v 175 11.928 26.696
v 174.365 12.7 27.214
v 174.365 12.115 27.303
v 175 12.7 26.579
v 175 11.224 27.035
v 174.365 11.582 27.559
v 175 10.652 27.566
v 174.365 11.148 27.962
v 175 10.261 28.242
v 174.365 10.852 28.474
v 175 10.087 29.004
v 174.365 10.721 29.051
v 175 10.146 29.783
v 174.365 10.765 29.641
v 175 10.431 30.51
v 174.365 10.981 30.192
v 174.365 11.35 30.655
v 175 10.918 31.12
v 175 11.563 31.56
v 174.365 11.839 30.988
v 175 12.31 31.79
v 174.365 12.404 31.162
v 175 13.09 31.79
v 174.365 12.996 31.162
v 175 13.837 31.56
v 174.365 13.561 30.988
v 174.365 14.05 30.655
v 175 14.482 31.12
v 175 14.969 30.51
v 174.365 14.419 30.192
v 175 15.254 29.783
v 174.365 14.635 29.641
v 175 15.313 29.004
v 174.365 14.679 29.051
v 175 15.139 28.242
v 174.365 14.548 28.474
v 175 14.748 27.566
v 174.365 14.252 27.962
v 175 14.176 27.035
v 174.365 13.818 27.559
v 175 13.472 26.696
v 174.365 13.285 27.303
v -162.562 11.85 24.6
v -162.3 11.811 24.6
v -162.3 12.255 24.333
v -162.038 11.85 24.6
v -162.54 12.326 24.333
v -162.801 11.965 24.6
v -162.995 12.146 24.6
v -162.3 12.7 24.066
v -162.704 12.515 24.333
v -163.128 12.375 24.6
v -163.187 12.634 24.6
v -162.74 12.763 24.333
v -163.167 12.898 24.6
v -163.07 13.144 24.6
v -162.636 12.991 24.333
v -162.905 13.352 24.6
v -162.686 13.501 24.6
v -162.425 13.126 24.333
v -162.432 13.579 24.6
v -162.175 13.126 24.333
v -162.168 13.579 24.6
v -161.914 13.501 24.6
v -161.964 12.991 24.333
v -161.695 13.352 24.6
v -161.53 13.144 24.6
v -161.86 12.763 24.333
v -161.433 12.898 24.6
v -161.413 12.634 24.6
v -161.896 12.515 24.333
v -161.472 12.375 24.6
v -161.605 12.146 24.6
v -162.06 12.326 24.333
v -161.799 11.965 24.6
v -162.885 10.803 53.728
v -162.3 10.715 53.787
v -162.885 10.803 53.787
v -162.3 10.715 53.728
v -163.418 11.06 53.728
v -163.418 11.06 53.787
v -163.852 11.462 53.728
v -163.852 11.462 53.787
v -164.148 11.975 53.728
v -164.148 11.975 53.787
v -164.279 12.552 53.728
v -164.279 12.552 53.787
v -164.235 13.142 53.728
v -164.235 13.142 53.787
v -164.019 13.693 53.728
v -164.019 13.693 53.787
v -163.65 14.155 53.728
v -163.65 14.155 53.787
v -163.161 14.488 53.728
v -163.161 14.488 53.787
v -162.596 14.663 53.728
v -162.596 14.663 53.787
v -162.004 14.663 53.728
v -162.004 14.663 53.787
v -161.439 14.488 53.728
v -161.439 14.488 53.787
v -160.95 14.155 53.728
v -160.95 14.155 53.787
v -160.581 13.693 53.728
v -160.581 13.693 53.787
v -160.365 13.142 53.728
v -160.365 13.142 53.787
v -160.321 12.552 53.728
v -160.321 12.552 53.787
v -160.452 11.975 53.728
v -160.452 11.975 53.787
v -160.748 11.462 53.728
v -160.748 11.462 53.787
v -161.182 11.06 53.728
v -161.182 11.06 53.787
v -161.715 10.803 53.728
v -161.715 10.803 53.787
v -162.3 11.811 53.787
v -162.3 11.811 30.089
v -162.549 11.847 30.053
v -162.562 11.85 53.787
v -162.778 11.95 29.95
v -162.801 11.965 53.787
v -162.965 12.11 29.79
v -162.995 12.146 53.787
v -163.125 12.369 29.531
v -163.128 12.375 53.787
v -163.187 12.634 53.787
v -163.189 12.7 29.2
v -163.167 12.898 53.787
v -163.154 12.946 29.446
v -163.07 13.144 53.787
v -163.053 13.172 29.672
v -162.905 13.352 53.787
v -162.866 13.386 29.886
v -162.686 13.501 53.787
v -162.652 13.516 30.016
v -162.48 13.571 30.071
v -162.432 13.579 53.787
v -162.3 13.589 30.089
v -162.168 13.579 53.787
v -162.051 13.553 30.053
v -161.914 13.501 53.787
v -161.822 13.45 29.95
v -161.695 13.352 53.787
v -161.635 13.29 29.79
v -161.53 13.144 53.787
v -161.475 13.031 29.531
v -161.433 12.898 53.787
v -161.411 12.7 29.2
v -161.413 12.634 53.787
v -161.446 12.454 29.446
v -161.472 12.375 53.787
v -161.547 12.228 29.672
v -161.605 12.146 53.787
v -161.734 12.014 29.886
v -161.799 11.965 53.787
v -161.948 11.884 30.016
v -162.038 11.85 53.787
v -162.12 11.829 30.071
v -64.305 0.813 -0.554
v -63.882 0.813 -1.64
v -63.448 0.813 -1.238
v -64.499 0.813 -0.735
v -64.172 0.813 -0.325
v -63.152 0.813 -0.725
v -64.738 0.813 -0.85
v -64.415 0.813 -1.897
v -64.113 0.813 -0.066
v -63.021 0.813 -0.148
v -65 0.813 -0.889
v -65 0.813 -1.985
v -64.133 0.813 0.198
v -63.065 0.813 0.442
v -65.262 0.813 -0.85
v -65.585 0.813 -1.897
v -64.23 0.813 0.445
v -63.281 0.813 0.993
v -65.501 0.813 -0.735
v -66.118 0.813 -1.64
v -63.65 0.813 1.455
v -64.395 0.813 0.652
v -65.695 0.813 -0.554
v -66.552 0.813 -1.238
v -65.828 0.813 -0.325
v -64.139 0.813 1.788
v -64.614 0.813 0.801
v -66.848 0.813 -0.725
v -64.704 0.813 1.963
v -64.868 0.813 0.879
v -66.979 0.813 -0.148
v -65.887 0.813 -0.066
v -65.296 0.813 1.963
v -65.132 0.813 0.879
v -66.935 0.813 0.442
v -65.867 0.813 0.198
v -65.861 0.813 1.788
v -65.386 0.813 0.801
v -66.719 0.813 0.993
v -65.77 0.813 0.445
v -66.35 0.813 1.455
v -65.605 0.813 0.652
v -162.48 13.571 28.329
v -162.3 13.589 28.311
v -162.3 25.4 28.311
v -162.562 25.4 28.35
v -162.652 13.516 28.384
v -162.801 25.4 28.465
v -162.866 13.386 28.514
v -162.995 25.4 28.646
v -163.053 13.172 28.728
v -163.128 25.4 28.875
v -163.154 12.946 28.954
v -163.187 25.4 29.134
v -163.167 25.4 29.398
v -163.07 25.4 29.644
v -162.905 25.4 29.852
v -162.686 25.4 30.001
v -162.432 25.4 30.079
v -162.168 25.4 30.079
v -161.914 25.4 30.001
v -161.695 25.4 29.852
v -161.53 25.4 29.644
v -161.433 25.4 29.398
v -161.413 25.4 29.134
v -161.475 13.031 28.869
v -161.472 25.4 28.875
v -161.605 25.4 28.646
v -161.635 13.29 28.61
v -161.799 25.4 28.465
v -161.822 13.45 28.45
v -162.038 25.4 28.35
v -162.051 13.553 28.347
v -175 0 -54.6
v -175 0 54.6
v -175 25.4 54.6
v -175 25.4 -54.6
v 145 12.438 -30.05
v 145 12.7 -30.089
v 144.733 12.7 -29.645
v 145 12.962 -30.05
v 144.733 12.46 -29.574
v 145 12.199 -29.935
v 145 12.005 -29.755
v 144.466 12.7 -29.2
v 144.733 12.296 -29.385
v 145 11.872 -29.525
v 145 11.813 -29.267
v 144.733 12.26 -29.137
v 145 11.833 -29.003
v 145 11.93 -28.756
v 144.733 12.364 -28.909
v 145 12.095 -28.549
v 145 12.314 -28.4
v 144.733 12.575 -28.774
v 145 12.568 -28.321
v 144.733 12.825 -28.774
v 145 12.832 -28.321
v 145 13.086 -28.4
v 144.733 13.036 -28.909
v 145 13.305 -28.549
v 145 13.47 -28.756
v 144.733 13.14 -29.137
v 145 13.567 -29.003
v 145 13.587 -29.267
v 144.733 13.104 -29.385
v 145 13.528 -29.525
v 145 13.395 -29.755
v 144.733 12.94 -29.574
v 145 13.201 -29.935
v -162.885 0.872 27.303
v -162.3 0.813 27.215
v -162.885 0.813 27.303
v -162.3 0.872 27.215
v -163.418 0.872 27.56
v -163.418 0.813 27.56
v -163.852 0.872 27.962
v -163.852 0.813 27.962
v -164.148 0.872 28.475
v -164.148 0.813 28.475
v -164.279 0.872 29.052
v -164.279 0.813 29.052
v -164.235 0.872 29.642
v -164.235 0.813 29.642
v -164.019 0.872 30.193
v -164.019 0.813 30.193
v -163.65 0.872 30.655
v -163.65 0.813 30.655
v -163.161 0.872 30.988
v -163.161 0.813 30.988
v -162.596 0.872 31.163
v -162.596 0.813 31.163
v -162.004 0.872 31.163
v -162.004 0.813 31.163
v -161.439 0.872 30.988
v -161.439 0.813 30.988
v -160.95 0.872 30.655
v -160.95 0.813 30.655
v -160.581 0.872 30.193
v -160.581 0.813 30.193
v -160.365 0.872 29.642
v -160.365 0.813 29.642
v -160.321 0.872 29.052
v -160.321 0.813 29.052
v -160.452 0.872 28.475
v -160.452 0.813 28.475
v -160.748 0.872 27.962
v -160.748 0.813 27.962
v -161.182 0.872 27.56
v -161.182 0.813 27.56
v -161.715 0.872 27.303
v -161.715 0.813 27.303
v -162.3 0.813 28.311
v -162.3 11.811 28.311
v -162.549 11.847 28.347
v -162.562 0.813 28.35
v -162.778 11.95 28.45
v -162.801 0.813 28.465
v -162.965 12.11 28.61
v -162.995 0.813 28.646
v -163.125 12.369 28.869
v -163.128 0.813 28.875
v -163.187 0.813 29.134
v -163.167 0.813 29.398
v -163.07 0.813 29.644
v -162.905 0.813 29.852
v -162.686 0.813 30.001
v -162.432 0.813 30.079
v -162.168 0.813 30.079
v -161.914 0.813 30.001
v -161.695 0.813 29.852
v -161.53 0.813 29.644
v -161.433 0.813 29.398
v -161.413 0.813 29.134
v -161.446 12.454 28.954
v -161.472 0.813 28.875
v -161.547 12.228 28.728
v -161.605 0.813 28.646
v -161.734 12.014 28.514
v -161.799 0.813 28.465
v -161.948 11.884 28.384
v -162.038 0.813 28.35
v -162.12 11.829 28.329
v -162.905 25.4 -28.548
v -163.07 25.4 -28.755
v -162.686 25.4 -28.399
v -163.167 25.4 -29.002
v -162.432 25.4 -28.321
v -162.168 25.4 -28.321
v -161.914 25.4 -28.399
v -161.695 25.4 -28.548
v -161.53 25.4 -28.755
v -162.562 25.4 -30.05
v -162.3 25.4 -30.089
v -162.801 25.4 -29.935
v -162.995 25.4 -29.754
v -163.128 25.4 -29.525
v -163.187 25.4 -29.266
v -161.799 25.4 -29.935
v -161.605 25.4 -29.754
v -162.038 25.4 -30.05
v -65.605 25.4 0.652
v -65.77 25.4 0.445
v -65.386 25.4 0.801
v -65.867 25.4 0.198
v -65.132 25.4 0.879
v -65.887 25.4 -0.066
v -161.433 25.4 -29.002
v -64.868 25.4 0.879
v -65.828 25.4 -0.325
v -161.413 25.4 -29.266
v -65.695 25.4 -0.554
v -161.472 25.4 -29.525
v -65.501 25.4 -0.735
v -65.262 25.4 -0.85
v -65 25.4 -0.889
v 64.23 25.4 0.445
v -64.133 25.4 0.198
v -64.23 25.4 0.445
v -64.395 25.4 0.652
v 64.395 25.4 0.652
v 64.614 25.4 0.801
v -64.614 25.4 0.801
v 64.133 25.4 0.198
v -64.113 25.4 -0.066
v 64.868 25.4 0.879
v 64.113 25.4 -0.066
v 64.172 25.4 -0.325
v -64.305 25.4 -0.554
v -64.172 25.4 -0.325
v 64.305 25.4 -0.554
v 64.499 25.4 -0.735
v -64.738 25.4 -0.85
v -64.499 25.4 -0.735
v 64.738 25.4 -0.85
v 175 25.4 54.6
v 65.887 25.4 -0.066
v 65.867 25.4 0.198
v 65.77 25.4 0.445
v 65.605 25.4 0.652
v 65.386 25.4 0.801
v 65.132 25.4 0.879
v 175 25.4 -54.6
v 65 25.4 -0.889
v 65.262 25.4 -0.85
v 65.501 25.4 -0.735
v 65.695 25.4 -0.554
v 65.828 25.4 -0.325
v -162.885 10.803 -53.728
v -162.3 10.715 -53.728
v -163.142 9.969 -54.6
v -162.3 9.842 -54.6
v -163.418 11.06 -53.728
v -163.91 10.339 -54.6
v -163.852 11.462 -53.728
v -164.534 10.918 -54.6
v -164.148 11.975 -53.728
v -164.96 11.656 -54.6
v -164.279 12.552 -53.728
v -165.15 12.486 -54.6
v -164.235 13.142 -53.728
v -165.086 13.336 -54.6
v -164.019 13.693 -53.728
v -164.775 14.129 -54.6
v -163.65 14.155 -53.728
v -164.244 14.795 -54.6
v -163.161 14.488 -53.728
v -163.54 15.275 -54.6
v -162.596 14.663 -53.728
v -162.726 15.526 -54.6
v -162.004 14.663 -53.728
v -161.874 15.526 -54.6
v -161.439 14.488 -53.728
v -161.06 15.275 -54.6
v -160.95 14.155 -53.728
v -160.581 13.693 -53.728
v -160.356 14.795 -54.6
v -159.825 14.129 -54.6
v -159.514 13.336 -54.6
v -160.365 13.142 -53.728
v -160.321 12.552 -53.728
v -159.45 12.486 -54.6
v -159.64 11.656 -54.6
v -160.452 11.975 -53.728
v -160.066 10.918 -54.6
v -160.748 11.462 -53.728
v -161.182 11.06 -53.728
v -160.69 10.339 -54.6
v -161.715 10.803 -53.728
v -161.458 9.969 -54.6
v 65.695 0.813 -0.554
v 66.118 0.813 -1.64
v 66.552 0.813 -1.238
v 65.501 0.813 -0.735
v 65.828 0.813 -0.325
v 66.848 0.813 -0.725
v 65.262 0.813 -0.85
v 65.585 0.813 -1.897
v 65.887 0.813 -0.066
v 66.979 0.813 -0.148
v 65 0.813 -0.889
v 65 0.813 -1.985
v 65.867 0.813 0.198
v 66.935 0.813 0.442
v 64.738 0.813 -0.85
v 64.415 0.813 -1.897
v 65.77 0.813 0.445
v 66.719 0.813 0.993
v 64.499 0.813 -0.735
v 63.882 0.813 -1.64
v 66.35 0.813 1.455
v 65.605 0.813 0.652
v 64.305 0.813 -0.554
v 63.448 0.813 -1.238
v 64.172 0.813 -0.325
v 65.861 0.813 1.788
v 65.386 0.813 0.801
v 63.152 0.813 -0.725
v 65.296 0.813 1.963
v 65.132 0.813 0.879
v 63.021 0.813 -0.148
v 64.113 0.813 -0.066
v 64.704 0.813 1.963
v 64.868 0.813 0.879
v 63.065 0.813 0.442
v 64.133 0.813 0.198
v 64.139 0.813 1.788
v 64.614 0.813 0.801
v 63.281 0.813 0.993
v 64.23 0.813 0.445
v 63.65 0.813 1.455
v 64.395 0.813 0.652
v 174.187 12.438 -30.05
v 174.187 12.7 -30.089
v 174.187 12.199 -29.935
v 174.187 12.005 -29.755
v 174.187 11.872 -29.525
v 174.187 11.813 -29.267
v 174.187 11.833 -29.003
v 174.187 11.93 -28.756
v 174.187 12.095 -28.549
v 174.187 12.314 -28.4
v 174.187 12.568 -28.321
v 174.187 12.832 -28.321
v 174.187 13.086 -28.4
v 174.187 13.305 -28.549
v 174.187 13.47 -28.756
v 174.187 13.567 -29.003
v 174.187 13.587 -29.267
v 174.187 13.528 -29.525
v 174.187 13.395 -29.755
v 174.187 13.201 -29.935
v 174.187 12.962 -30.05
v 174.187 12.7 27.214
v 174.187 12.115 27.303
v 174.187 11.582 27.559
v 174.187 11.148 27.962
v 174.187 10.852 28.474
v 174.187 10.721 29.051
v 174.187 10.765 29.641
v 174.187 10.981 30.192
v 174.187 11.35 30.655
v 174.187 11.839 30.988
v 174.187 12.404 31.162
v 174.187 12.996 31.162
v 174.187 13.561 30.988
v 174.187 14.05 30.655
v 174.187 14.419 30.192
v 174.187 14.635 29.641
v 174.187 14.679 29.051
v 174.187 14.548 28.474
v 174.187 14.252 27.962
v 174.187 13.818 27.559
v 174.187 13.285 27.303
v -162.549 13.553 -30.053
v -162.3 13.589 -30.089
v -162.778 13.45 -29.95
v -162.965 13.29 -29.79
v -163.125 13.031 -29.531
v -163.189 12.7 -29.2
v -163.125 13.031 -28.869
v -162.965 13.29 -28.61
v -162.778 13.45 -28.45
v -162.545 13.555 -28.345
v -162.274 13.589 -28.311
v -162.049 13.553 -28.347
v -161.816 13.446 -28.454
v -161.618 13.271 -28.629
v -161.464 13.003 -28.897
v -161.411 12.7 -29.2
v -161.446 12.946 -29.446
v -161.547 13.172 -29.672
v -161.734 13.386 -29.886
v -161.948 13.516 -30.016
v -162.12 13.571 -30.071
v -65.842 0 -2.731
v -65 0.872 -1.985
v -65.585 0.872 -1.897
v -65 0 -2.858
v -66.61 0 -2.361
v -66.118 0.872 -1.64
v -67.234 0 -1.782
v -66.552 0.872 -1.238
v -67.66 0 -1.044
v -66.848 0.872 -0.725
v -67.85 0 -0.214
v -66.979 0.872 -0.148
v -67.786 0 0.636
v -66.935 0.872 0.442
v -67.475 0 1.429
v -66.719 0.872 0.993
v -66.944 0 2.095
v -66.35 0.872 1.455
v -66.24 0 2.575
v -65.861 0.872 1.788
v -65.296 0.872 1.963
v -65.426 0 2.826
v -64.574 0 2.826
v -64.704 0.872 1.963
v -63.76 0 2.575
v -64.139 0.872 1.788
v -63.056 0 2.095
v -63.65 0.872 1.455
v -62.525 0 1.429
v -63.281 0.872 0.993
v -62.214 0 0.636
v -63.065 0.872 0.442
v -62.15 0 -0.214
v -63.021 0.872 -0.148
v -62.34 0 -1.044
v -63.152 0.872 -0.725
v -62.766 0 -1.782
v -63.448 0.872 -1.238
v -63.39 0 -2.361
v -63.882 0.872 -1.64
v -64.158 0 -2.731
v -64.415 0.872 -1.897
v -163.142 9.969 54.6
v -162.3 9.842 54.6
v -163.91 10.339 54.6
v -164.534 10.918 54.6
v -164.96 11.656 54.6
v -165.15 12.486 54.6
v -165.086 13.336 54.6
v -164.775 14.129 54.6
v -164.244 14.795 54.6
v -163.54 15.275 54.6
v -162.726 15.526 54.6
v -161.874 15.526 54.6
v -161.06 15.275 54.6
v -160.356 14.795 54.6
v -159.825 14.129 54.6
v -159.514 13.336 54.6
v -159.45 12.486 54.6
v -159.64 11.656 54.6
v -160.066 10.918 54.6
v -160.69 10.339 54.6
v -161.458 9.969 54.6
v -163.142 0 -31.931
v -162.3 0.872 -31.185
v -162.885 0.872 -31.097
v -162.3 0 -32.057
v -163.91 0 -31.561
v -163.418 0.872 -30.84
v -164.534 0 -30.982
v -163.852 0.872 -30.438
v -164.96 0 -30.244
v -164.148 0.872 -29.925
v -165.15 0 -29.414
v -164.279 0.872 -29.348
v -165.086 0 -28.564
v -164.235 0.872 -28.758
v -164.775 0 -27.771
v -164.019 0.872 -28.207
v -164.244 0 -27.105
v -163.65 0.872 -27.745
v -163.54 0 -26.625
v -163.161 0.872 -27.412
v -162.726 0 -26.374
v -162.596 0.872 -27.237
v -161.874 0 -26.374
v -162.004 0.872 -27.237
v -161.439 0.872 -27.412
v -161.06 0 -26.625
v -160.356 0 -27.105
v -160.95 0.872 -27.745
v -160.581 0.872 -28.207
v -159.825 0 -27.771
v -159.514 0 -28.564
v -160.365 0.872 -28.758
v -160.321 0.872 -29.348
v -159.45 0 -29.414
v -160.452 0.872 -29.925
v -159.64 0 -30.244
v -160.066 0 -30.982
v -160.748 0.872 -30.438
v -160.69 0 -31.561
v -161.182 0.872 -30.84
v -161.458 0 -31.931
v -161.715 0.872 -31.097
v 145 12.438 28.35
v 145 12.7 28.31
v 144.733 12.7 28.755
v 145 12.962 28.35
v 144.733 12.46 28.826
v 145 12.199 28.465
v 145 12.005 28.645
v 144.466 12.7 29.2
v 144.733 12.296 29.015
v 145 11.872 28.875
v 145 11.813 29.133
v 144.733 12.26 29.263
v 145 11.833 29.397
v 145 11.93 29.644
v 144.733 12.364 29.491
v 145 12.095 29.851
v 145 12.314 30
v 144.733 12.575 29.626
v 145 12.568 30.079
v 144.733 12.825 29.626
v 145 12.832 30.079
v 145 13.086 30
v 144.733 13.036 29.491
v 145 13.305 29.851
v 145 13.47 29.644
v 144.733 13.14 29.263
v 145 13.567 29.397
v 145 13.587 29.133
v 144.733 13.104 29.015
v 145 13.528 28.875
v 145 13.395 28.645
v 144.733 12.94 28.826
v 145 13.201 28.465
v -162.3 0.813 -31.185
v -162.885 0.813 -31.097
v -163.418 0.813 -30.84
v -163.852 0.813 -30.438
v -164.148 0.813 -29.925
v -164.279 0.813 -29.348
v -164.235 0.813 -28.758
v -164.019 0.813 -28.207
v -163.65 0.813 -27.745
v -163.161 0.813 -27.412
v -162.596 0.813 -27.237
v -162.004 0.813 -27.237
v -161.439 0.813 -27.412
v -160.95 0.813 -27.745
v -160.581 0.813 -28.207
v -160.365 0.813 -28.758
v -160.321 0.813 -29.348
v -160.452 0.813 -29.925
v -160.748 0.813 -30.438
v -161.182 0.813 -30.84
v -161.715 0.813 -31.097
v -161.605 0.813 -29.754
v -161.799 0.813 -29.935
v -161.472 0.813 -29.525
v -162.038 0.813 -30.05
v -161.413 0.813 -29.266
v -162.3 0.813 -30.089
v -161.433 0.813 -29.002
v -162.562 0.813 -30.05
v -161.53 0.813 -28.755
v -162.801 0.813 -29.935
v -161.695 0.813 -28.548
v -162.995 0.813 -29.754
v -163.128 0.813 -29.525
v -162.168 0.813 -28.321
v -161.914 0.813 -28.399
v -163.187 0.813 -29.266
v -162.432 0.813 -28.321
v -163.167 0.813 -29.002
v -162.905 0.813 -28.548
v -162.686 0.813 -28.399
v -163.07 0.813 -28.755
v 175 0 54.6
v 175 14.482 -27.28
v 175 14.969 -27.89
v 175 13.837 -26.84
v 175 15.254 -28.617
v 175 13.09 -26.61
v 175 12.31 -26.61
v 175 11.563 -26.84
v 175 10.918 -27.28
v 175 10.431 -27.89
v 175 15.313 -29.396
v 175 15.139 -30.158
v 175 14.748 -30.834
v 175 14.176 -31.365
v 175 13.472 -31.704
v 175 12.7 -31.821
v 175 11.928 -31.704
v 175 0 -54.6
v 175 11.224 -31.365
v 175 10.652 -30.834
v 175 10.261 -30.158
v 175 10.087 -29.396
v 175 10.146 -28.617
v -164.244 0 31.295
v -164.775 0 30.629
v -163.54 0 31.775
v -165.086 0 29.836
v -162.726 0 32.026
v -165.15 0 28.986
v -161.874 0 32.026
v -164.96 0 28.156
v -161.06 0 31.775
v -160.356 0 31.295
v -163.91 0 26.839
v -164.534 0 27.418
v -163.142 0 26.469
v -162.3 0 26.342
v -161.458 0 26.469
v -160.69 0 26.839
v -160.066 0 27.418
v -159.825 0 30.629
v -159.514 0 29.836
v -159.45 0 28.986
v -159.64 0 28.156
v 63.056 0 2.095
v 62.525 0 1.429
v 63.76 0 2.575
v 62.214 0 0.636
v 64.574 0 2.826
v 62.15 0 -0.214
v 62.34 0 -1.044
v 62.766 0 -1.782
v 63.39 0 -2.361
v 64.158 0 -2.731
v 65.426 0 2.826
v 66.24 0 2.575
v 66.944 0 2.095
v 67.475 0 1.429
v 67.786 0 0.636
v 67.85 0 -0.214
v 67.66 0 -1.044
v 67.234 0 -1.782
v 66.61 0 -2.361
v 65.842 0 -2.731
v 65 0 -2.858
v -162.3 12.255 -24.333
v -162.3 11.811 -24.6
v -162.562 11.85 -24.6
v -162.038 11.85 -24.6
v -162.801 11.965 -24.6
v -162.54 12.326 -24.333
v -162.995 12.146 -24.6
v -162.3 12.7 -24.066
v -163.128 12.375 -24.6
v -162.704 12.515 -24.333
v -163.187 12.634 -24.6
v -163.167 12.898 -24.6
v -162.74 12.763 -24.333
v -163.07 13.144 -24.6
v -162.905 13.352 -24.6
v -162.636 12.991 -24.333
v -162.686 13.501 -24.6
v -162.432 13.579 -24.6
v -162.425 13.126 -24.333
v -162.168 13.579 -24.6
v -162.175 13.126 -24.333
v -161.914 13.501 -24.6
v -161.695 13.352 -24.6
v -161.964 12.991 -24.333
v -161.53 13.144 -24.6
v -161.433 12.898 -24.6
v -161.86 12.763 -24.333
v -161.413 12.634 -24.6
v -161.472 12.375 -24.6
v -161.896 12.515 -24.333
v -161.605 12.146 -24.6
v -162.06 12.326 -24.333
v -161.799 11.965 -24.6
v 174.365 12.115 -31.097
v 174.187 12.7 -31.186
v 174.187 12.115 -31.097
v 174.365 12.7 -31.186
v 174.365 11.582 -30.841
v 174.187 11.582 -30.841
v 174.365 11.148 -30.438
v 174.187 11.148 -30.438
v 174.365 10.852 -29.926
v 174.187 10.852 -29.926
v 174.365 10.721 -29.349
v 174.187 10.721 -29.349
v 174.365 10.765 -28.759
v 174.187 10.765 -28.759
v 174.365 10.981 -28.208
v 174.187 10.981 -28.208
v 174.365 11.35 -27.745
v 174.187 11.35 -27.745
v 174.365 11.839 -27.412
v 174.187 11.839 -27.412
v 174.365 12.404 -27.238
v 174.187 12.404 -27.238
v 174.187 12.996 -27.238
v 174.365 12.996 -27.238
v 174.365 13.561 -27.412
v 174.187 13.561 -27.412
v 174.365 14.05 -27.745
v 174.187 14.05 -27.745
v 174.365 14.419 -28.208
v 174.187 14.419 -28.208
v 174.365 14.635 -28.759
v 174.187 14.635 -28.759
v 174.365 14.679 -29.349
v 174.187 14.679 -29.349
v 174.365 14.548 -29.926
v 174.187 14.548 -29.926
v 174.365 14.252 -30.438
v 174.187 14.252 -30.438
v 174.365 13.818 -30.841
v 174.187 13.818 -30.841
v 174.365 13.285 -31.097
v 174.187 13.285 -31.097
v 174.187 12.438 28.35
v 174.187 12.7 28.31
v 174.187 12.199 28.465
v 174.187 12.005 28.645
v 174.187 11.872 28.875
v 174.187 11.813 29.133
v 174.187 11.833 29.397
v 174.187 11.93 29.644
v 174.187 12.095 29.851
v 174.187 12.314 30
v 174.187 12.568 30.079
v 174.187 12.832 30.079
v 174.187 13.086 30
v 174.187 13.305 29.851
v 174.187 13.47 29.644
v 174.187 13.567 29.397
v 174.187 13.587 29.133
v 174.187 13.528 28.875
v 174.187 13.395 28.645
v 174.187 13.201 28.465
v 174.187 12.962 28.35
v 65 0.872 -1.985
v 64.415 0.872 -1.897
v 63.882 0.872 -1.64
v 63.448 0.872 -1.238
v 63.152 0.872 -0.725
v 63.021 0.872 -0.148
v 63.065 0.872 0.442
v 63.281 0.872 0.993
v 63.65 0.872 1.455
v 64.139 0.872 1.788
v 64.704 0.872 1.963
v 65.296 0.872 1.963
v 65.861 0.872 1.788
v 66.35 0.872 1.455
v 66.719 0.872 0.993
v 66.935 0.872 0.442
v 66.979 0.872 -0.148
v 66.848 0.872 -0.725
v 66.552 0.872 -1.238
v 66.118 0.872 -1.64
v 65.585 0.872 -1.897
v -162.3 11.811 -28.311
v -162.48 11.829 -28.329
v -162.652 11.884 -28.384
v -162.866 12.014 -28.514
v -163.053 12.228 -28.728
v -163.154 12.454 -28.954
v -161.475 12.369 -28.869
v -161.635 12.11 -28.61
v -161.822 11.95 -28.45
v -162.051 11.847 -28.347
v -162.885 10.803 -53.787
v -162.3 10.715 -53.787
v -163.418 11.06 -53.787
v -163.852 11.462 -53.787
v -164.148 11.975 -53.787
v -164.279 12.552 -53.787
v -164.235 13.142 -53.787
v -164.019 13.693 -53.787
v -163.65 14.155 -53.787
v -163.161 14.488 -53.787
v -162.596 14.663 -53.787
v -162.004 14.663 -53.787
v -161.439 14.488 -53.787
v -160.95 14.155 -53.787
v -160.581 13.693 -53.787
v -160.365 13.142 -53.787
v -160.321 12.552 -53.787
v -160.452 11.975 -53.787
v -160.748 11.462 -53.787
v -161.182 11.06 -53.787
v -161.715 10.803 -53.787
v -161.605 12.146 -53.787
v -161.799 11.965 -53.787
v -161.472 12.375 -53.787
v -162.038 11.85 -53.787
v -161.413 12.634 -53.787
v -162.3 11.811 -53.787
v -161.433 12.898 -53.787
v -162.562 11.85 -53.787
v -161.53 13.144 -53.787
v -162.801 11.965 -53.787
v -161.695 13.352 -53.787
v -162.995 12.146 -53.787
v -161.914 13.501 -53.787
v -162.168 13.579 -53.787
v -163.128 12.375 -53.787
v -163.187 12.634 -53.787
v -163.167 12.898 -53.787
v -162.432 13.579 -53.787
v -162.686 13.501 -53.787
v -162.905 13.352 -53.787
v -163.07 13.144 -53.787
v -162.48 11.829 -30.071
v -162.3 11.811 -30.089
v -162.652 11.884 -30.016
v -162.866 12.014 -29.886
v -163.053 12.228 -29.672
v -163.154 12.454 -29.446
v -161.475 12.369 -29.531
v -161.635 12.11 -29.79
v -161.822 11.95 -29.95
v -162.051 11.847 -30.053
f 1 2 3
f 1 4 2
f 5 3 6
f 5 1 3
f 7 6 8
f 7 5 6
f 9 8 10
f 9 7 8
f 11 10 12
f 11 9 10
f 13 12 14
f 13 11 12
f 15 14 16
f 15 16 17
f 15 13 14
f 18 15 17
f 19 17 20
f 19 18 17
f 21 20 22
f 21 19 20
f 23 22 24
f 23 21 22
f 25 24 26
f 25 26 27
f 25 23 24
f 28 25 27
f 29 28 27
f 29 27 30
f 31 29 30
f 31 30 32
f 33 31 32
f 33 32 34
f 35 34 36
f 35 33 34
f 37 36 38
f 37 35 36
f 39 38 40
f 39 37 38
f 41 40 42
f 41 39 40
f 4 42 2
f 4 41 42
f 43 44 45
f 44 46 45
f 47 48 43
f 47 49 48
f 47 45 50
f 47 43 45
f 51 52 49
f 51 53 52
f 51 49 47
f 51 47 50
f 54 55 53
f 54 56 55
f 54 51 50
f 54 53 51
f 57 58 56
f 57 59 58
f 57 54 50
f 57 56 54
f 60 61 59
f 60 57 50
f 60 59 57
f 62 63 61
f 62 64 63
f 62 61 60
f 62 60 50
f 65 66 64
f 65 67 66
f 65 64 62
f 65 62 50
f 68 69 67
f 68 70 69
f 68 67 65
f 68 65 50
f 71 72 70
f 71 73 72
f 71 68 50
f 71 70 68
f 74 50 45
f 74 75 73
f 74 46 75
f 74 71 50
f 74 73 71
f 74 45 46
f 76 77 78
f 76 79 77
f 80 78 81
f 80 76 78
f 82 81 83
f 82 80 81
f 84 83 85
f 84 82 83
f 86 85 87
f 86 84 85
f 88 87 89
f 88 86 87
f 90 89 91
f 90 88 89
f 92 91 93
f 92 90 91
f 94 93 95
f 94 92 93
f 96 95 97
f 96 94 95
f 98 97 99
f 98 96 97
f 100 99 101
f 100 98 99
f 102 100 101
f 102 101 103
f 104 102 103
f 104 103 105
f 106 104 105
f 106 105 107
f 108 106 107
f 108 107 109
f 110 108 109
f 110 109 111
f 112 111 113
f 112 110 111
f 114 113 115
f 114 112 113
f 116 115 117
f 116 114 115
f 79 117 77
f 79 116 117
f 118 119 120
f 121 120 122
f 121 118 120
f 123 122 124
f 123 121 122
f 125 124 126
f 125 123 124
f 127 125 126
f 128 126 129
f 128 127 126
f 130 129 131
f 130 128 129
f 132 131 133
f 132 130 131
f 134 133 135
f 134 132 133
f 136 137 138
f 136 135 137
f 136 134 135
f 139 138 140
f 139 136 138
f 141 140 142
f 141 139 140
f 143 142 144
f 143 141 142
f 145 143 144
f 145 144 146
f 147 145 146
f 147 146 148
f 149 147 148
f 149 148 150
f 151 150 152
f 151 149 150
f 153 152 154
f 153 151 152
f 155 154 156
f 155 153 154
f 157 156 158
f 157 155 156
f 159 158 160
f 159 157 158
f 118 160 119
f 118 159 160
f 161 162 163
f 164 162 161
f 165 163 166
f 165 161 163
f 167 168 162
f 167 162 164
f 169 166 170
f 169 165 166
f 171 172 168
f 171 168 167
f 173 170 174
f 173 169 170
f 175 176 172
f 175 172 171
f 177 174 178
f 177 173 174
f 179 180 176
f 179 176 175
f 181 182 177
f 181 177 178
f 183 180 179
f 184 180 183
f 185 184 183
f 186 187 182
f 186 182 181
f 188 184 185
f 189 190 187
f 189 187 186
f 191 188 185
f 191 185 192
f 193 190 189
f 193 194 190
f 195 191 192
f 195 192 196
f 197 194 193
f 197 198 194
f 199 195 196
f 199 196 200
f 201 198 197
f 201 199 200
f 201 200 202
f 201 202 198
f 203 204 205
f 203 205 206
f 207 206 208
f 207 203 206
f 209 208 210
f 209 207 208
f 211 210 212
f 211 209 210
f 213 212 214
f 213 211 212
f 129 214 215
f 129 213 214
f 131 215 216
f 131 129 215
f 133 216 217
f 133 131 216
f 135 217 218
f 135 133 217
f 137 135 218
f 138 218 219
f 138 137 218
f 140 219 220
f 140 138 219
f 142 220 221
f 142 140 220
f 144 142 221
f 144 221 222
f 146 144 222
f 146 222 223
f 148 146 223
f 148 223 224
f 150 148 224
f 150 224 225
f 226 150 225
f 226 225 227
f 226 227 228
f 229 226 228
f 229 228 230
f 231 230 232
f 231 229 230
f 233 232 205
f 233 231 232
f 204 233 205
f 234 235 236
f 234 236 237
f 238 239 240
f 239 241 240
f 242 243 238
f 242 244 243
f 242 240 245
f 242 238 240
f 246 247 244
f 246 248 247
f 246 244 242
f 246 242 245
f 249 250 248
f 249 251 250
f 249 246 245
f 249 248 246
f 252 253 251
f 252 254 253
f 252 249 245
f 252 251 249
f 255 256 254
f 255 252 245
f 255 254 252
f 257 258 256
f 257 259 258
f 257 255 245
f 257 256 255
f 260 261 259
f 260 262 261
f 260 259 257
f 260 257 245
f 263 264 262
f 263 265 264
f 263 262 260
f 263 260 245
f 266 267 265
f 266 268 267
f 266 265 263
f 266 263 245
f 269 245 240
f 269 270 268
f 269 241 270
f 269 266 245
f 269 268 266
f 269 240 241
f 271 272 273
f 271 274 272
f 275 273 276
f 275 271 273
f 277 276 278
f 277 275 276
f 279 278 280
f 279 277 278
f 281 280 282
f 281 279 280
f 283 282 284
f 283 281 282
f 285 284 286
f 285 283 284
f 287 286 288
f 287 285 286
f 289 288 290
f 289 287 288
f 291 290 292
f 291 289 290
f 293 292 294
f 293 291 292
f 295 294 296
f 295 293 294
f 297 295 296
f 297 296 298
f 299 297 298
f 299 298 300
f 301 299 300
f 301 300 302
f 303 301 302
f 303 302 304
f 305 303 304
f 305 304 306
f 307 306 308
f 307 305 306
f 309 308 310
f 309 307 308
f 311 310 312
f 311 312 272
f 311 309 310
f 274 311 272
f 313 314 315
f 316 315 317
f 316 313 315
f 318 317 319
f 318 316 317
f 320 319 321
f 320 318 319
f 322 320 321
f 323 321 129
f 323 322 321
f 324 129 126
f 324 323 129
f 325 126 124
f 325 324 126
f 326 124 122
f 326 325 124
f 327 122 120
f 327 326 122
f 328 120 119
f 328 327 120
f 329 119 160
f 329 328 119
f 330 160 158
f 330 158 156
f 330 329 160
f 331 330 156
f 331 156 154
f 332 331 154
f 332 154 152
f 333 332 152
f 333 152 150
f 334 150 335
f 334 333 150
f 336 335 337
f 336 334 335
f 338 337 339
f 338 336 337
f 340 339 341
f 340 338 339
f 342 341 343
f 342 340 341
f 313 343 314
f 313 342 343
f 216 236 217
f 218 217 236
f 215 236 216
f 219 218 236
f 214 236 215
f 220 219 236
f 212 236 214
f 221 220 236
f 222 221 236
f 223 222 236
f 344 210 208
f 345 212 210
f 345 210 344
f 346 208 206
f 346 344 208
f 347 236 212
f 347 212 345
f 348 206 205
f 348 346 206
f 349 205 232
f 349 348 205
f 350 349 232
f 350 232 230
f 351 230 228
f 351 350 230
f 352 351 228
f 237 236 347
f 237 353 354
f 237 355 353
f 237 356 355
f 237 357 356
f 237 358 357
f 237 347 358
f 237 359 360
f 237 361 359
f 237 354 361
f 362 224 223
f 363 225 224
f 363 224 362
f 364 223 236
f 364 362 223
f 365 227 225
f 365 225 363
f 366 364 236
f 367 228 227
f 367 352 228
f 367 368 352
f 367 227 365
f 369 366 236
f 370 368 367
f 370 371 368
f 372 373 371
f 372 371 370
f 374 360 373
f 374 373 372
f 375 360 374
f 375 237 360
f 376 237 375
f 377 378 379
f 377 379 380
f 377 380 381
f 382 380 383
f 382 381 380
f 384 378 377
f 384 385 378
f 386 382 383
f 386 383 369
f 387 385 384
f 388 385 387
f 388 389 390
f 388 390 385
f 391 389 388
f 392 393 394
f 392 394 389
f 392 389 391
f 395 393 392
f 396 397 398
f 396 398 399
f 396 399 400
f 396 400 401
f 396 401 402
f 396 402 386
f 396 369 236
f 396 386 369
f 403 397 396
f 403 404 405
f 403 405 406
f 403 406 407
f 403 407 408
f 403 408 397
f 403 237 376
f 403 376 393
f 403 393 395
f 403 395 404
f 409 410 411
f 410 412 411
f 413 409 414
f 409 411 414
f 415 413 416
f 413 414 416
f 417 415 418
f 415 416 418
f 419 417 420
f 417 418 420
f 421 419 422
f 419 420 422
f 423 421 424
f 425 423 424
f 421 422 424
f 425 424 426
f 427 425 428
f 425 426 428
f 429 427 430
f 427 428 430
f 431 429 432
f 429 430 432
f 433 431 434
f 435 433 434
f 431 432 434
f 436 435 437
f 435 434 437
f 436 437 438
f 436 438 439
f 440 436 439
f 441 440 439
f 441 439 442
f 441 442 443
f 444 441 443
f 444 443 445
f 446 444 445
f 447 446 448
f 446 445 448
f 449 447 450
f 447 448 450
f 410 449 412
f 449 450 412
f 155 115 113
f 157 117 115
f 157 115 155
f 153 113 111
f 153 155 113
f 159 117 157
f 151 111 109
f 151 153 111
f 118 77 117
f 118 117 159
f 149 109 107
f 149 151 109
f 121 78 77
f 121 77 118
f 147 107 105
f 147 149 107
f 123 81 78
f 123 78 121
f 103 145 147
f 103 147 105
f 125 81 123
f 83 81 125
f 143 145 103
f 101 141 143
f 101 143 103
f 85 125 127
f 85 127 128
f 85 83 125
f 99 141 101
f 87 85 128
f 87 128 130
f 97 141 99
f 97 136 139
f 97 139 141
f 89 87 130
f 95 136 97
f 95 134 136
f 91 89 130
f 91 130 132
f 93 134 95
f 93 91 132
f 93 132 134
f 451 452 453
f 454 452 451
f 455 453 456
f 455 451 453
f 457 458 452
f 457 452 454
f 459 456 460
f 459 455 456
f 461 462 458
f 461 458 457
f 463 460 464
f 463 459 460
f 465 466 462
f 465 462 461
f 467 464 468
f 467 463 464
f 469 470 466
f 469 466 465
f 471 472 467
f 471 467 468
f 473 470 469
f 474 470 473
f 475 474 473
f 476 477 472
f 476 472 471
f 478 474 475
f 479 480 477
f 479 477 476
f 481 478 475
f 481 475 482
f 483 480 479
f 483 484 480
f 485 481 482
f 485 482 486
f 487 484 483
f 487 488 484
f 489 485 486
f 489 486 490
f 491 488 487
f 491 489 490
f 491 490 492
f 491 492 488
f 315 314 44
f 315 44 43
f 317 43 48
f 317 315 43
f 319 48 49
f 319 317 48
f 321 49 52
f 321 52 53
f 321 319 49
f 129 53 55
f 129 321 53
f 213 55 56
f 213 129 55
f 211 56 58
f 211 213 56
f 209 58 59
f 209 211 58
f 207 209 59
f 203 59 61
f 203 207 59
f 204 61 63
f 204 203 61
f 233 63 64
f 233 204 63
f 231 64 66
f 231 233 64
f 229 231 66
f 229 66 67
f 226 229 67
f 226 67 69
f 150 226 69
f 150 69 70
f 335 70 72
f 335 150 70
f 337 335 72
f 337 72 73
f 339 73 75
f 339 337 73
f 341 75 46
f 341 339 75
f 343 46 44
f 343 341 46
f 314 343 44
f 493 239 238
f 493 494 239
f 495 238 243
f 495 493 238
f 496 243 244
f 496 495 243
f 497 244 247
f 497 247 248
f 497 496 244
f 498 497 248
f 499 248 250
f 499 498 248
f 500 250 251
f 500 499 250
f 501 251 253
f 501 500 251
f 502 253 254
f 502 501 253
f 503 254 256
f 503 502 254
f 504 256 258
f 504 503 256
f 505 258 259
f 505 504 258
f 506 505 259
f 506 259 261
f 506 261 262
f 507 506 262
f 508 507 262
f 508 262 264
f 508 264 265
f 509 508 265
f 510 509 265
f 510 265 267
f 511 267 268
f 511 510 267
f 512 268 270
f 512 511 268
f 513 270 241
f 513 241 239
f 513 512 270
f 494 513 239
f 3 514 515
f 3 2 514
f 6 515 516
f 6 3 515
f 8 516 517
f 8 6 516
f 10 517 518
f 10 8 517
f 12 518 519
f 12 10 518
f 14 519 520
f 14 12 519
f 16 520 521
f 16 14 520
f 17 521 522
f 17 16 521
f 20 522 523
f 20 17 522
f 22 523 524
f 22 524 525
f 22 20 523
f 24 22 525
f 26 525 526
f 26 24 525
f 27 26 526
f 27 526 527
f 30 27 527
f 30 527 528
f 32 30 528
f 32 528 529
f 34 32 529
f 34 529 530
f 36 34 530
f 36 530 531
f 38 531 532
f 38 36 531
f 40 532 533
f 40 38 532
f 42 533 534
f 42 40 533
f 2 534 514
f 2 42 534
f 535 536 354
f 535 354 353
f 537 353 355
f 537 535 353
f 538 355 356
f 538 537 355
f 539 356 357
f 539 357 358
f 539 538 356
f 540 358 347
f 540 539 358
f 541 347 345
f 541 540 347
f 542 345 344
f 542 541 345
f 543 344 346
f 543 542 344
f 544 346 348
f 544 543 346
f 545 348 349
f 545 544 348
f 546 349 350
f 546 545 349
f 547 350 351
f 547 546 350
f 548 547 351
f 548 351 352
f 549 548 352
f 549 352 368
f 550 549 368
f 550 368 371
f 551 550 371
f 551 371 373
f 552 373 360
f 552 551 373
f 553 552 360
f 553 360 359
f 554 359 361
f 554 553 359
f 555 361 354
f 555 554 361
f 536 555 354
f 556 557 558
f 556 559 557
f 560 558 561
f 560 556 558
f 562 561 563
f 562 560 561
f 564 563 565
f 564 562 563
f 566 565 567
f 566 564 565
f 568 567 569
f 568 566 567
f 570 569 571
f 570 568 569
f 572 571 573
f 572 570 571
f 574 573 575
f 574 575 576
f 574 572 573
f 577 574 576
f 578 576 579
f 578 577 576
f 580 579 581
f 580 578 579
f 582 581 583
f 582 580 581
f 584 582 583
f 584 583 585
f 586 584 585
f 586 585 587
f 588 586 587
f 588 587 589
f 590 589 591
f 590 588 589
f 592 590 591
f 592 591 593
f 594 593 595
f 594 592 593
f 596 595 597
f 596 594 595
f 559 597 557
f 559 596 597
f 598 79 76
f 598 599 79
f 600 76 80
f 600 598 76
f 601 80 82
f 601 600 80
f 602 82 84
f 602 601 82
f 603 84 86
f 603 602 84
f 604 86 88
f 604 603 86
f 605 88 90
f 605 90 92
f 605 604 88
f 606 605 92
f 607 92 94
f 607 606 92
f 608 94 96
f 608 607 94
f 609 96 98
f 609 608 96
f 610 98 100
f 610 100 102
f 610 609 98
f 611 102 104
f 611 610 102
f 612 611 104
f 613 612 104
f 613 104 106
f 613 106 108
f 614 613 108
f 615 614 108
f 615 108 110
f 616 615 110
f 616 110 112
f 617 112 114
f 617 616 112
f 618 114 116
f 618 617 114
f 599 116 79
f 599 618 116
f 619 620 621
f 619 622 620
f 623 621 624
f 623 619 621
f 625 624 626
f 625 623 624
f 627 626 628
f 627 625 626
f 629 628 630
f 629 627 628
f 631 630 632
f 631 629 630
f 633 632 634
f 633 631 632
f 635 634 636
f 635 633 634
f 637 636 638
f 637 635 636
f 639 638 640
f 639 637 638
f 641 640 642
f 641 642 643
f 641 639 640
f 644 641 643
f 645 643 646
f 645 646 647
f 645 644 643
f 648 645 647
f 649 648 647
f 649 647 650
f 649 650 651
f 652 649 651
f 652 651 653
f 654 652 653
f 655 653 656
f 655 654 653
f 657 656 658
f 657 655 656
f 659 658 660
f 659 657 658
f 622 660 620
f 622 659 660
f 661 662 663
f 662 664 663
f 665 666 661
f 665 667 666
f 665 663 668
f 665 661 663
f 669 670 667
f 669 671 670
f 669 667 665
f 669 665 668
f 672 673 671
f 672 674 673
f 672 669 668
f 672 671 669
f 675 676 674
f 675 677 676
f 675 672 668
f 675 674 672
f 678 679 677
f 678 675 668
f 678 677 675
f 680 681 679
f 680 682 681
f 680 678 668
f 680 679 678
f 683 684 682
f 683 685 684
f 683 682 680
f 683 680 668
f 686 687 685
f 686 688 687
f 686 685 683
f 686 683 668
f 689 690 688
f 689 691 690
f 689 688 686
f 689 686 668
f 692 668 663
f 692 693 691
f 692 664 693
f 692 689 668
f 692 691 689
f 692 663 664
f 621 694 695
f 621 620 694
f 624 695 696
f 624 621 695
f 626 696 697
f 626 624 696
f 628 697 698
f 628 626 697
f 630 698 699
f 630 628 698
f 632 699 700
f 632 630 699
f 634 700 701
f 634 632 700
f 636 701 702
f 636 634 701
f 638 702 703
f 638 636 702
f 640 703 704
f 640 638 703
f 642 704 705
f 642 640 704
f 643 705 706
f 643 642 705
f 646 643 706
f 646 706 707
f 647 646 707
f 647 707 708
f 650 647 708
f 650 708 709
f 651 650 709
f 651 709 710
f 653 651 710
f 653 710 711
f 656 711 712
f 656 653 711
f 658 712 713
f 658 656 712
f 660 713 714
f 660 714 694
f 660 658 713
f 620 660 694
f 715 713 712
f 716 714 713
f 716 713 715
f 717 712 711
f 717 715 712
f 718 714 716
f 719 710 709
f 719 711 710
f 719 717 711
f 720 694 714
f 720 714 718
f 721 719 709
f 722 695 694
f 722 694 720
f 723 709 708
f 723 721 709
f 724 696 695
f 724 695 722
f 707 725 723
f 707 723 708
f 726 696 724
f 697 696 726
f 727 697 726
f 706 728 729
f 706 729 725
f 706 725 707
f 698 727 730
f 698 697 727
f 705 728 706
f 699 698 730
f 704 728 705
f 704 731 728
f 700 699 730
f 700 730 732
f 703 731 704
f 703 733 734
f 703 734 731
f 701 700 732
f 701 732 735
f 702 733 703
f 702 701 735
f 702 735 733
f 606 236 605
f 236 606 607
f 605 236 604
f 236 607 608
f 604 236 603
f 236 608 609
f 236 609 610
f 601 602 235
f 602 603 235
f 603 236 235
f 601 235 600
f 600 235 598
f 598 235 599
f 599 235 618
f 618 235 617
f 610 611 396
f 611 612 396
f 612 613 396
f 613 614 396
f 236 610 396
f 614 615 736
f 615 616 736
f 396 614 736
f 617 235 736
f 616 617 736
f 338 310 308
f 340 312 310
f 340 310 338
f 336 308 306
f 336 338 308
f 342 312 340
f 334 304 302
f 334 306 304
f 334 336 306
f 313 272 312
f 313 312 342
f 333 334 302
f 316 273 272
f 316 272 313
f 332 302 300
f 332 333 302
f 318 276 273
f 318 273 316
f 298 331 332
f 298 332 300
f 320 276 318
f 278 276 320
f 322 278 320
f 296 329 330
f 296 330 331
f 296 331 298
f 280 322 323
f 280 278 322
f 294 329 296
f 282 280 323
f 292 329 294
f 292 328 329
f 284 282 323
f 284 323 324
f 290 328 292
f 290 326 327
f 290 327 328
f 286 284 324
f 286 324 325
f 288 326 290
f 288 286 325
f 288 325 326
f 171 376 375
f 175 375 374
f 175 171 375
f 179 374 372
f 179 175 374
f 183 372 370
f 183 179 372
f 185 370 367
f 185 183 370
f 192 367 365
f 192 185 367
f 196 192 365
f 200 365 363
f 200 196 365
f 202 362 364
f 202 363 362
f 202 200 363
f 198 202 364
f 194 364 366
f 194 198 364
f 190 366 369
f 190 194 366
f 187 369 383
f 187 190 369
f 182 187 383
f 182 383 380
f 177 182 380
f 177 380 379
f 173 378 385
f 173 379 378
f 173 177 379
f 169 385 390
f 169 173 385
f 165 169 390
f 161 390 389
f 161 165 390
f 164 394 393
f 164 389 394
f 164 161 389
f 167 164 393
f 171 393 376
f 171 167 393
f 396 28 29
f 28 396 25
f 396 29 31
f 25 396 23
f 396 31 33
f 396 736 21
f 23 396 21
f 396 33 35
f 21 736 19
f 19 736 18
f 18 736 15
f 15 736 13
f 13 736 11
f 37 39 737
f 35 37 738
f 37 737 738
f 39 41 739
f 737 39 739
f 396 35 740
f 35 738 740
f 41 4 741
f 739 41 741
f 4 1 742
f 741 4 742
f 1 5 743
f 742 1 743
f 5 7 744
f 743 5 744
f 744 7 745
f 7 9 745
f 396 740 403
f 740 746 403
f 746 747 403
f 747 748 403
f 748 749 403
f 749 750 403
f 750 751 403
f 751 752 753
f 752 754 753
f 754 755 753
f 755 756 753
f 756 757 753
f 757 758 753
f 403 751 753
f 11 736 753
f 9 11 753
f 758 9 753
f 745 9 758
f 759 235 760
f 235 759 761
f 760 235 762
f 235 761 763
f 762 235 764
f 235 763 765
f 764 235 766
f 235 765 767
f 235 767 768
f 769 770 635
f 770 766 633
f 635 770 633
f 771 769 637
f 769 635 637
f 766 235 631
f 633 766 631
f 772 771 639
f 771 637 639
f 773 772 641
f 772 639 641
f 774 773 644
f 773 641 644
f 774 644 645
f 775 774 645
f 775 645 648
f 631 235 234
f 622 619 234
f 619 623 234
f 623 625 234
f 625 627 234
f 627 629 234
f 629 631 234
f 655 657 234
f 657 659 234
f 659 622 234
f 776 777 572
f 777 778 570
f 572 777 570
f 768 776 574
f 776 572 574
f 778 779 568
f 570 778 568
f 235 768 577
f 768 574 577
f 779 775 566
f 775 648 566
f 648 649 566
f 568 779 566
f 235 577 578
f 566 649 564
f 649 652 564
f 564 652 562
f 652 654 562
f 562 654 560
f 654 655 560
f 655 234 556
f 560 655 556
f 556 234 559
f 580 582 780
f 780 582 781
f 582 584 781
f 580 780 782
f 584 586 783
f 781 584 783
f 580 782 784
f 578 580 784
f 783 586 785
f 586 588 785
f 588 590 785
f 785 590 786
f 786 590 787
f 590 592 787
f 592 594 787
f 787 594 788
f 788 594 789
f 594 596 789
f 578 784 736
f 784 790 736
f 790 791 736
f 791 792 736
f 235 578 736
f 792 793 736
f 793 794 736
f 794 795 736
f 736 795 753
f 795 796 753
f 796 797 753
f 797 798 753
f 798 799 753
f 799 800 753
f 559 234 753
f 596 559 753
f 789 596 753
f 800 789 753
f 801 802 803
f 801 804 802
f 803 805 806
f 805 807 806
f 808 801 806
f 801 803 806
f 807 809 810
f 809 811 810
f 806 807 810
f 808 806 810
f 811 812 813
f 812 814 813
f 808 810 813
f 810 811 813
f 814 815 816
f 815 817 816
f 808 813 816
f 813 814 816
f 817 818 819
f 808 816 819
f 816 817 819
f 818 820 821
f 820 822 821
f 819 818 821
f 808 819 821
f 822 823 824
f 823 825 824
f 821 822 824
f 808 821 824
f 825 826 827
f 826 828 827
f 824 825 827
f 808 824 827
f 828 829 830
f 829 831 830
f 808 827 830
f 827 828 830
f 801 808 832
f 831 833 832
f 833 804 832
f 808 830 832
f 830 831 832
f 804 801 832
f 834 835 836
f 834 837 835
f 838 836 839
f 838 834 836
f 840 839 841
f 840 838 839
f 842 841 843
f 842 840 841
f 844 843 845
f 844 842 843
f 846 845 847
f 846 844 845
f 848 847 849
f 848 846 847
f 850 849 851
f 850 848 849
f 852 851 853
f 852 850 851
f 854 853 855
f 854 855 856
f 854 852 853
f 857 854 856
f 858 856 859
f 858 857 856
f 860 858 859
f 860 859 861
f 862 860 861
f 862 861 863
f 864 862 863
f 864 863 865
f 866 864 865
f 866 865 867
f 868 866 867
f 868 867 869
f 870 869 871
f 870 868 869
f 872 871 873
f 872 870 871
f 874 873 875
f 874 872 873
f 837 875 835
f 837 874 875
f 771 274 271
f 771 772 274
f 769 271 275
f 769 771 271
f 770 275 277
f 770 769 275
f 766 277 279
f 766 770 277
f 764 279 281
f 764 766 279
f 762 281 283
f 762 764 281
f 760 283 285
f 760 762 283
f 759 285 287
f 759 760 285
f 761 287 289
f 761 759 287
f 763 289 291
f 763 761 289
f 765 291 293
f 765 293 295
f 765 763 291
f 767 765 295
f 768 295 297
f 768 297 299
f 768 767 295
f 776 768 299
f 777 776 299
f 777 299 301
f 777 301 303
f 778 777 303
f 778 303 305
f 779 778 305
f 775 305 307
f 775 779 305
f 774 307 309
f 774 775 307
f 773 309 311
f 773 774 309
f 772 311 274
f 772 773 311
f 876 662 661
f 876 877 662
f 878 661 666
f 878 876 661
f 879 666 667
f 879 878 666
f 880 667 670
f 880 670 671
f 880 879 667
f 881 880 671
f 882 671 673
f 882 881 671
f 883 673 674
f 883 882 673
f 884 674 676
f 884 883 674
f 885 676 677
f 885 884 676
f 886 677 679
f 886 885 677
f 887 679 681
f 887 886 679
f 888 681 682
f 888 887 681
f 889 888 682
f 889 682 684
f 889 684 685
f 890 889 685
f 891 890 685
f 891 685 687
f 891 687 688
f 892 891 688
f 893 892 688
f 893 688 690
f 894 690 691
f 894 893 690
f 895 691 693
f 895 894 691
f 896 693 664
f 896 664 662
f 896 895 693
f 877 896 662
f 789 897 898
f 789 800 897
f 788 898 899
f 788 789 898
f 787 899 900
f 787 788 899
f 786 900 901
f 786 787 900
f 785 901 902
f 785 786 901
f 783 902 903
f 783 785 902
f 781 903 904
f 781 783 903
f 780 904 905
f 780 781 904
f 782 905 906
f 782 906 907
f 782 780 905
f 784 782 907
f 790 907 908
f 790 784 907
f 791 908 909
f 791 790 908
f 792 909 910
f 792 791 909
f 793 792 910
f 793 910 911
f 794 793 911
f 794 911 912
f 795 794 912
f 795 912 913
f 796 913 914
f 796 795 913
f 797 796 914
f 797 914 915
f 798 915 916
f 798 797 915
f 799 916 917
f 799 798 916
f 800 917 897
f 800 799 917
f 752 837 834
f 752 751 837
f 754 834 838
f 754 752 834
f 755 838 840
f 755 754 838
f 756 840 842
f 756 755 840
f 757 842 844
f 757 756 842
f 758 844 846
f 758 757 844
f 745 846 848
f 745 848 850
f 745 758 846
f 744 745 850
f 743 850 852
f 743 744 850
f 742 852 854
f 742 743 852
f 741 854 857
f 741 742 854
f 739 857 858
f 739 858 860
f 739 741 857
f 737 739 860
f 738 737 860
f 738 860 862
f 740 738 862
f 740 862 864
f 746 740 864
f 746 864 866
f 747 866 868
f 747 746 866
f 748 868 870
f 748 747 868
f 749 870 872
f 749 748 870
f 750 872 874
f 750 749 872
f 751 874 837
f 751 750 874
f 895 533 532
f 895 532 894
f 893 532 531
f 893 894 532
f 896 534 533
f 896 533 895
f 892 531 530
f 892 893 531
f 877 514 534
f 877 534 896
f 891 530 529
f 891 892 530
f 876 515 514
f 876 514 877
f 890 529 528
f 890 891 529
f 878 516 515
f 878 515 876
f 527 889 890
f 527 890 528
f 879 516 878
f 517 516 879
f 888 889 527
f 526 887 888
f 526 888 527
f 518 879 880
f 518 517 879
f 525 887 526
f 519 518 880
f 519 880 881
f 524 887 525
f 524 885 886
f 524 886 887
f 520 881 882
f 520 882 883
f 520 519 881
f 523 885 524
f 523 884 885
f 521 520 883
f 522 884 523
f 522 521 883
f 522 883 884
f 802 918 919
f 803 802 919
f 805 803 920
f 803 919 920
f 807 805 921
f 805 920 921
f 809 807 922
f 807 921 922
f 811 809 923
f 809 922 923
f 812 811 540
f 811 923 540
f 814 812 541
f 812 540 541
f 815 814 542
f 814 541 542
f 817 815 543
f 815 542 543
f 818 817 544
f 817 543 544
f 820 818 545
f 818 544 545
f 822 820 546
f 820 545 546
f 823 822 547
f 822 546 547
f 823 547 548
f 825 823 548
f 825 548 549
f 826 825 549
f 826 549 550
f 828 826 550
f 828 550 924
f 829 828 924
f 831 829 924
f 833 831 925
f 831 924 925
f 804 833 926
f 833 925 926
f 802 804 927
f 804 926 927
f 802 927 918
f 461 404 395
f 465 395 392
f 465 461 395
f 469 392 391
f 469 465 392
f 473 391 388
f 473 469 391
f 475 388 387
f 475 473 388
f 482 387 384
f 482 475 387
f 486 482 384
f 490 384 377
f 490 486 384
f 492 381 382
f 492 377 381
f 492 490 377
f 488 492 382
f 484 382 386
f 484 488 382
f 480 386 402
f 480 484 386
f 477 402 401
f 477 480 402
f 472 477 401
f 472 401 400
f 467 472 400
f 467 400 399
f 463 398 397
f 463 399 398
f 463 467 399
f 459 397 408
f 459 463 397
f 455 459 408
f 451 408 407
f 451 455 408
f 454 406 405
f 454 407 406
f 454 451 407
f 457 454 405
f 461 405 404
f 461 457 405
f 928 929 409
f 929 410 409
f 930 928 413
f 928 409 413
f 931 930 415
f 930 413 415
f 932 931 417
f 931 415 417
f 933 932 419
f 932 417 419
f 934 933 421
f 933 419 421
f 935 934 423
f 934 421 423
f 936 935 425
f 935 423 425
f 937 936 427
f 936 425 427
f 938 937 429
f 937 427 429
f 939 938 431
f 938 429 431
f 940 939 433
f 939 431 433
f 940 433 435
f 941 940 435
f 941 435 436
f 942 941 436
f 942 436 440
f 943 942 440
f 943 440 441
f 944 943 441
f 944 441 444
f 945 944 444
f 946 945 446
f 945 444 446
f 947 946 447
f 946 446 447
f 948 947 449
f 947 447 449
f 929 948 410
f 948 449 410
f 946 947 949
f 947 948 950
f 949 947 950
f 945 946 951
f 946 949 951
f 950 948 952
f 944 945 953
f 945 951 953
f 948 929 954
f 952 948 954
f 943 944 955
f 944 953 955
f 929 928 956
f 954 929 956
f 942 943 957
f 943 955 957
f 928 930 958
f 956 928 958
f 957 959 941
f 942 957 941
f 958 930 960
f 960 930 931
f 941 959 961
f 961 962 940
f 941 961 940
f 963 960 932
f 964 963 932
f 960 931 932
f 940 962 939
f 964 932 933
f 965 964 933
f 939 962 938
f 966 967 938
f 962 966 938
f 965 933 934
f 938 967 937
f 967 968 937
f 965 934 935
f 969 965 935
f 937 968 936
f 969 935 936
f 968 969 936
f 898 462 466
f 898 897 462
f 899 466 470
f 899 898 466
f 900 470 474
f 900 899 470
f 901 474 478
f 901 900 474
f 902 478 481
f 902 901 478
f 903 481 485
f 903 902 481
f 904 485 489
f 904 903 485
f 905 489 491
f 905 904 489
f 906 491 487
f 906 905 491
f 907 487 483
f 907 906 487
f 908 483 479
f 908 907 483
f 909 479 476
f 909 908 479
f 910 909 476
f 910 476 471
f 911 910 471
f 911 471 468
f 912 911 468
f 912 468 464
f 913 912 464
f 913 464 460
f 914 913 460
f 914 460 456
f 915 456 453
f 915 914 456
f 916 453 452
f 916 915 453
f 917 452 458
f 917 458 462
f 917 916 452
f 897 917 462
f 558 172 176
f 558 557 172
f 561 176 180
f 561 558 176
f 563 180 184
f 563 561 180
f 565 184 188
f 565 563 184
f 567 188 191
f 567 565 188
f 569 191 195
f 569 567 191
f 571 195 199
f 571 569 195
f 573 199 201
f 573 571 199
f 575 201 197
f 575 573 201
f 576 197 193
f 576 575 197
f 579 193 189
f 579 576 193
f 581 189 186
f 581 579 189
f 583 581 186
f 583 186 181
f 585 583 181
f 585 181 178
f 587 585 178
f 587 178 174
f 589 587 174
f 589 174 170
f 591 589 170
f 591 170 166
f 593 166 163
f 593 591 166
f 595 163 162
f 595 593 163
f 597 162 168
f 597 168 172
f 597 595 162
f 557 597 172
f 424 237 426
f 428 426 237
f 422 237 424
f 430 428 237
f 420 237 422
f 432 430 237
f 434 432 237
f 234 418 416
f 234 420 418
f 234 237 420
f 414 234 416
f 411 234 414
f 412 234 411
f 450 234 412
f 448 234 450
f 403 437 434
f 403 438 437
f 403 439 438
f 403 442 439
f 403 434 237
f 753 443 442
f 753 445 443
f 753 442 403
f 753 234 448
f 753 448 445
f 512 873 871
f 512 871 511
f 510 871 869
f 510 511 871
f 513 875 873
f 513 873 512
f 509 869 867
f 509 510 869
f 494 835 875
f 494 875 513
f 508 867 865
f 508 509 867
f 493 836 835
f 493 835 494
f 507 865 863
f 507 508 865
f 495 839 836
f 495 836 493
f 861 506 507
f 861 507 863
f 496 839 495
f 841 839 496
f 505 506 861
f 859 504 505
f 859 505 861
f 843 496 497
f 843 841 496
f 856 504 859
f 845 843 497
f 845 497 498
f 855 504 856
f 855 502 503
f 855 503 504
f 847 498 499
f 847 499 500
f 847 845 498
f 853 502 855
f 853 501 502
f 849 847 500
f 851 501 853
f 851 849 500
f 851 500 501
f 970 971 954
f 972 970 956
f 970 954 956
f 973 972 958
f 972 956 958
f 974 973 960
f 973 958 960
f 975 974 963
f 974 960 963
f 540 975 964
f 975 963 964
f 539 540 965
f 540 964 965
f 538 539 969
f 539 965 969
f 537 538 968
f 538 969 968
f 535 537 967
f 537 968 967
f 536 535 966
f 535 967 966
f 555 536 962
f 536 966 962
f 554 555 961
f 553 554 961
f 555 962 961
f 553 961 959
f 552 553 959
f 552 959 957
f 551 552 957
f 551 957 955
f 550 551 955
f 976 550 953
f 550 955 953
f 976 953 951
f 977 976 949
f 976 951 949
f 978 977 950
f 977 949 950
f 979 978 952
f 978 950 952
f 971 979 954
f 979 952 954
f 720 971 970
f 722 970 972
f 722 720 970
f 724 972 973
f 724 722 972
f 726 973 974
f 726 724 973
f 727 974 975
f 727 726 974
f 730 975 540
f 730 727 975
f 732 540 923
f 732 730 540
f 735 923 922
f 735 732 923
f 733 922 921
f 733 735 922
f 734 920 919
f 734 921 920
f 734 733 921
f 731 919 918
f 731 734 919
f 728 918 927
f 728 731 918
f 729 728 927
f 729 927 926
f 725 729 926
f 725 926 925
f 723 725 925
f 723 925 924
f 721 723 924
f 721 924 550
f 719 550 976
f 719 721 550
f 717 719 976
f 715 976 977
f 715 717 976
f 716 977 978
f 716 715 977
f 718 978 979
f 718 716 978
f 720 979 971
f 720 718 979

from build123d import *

# Parameters (mm, degrees)
SKETCH1_W                                   = 350
SKETCH1_H                                   = 109.2
BOSS_EXTRUDE1_DEPTH                         = 25.4
CBORE_FOR_0_BINDING_HEAD_MACHINE_SC_2_COUNT = 2
CBORE_FOR_0_BINDING_HEAD_MACHINE_SC_2_PITCH = 58.4
CBORE_FOR_0_BINDING_HEAD_MACHINE_SC_3_COUNT = 2
CBORE_FOR_0_BINDING_HEAD_MACHINE_SC_3_PITCH = 130
CBORE_FOR_0_BINDING_HEAD_MACHINE_SC_4_COUNT = 2
CBORE_FOR_0_BINDING_HEAD_MACHINE_SC_4_PITCH = 58.4


with BuildPart() as part:
    # Sketch1 → Boss-Extrude1 (new body)
    with BuildSketch(Plane(origin=(0, 0, 0), x_dir=(1, 0, 0), z_dir=(0, 1, 0))):
        Rectangle(SKETCH1_W, SKETCH1_H)
    extrude(amount=BOSS_EXTRUDE1_DEPTH)

    # Sketch3 → CBORE for #0 Binding Head Machine Screw1 (revolve, cut)
    with BuildSketch(Plane(origin=(-162.3, 12.7, 54.6), x_dir=(0, -1, 0), z_dir=(1, 0, 0))):
        Polygon((0, 0), (0, 30.53416509), (0.889, 30), (0.889, 0.8128), (1.98501, 0.8128), (1.98501, 0.87249), (2.8575, 0), align=None)
    cbore_for_0_binding_head_machine_screw1 = revolve(axis=Axis((-162.3, 12.7, 60.95), (0, 0, -1)), mode=Mode.SUBTRACT)

    # Mirror1: CBORE for #0 Binding Head Machine Screw1 across plane
    add(cbore_for_0_binding_head_machine_screw1.mirror(Plane.XY), mode=Mode.SUBTRACT)

    # Sketch5 → CBORE for #0 Binding Head Machine Screw2 (revolve, cut)
    with BuildSketch(Plane(origin=(175, 12.7, 29.1995), x_dir=(0, 0, -1), z_dir=(0, 1, 0))):
        Polygon((0, 0), (0, 30.53416509), (0.889, 30), (0.889, 0.8128), (1.98501, 0.8128), (1.98501, 0.635), (2.62001, 0), align=None)
    cbore_for_0_binding_head_machine_screw2 = revolve(axis=Axis((181.35, 12.7, 29.1995), (-1, 0, 0)), mode=Mode.SUBTRACT)

    # CBORE for _0 Binding Head Machine Sc 2: CBORE for #0 Binding Head Machine Screw2 ×2
    with Locations(*[(0, 0, -i * CBORE_FOR_0_BINDING_HEAD_MACHINE_SC_2_PITCH) for i in range(1, CBORE_FOR_0_BINDING_HEAD_MACHINE_SC_2_COUNT)]):
        add(cbore_for_0_binding_head_machine_screw2, mode=Mode.SUBTRACT)

    # Sketch9 → CBORE for #0 Binding Head Machine Screw4 (revolve, cut)
    with BuildSketch(Plane(origin=(-65, 0, 0), x_dir=(0, 0, -1), z_dir=(1, 0, 0))):
        Polygon((0, 0), (0, 30.53416509), (0.889, 30), (0.889, 0.8128), (1.98501, 0.8128), (1.98501, 0.87249), (2.8575, 0), align=None)
    cbore_for_0_binding_head_machine_screw4 = revolve(axis=Axis((-65, -6.35, 0), (0, 1, 0)), mode=Mode.SUBTRACT)

    # CBORE for _0 Binding Head Machine Sc 3: CBORE for #0 Binding Head Machine Screw4 ×2
    with Locations(*[(i * CBORE_FOR_0_BINDING_HEAD_MACHINE_SC_3_PITCH, 0, 0) for i in range(1, CBORE_FOR_0_BINDING_HEAD_MACHINE_SC_3_COUNT)]):
        add(cbore_for_0_binding_head_machine_screw4, mode=Mode.SUBTRACT)

    # Sketch13 → CBORE for #0 Binding Head Machine Screw6 (revolve, cut)
    with BuildSketch(Plane(origin=(-162.3, 0, -29.2), x_dir=(0, 0, -1), z_dir=(1, 0, 0))):
        Polygon((0, 0), (0, 25.4), (0.889, 25.4), (0.889, 0.8128), (1.98501, 0.8128), (1.98501, 0.87249), (2.8575, 0), align=None)
    cbore_for_0_binding_head_machine_screw6 = revolve(axis=Axis((-162.3, -6.35, -29.2), (0, 1, 0)), mode=Mode.SUBTRACT)

    # CBORE for _0 Binding Head Machine Sc 4: CBORE for #0 Binding Head Machine Screw6 ×2
    with Locations(*[(0, 0, i * CBORE_FOR_0_BINDING_HEAD_MACHINE_SC_4_PITCH) for i in range(1, CBORE_FOR_0_BINDING_HEAD_MACHINE_SC_4_COUNT)]):
        add(cbore_for_0_binding_head_machine_screw6, mode=Mode.SUBTRACT)


solid = part.part
